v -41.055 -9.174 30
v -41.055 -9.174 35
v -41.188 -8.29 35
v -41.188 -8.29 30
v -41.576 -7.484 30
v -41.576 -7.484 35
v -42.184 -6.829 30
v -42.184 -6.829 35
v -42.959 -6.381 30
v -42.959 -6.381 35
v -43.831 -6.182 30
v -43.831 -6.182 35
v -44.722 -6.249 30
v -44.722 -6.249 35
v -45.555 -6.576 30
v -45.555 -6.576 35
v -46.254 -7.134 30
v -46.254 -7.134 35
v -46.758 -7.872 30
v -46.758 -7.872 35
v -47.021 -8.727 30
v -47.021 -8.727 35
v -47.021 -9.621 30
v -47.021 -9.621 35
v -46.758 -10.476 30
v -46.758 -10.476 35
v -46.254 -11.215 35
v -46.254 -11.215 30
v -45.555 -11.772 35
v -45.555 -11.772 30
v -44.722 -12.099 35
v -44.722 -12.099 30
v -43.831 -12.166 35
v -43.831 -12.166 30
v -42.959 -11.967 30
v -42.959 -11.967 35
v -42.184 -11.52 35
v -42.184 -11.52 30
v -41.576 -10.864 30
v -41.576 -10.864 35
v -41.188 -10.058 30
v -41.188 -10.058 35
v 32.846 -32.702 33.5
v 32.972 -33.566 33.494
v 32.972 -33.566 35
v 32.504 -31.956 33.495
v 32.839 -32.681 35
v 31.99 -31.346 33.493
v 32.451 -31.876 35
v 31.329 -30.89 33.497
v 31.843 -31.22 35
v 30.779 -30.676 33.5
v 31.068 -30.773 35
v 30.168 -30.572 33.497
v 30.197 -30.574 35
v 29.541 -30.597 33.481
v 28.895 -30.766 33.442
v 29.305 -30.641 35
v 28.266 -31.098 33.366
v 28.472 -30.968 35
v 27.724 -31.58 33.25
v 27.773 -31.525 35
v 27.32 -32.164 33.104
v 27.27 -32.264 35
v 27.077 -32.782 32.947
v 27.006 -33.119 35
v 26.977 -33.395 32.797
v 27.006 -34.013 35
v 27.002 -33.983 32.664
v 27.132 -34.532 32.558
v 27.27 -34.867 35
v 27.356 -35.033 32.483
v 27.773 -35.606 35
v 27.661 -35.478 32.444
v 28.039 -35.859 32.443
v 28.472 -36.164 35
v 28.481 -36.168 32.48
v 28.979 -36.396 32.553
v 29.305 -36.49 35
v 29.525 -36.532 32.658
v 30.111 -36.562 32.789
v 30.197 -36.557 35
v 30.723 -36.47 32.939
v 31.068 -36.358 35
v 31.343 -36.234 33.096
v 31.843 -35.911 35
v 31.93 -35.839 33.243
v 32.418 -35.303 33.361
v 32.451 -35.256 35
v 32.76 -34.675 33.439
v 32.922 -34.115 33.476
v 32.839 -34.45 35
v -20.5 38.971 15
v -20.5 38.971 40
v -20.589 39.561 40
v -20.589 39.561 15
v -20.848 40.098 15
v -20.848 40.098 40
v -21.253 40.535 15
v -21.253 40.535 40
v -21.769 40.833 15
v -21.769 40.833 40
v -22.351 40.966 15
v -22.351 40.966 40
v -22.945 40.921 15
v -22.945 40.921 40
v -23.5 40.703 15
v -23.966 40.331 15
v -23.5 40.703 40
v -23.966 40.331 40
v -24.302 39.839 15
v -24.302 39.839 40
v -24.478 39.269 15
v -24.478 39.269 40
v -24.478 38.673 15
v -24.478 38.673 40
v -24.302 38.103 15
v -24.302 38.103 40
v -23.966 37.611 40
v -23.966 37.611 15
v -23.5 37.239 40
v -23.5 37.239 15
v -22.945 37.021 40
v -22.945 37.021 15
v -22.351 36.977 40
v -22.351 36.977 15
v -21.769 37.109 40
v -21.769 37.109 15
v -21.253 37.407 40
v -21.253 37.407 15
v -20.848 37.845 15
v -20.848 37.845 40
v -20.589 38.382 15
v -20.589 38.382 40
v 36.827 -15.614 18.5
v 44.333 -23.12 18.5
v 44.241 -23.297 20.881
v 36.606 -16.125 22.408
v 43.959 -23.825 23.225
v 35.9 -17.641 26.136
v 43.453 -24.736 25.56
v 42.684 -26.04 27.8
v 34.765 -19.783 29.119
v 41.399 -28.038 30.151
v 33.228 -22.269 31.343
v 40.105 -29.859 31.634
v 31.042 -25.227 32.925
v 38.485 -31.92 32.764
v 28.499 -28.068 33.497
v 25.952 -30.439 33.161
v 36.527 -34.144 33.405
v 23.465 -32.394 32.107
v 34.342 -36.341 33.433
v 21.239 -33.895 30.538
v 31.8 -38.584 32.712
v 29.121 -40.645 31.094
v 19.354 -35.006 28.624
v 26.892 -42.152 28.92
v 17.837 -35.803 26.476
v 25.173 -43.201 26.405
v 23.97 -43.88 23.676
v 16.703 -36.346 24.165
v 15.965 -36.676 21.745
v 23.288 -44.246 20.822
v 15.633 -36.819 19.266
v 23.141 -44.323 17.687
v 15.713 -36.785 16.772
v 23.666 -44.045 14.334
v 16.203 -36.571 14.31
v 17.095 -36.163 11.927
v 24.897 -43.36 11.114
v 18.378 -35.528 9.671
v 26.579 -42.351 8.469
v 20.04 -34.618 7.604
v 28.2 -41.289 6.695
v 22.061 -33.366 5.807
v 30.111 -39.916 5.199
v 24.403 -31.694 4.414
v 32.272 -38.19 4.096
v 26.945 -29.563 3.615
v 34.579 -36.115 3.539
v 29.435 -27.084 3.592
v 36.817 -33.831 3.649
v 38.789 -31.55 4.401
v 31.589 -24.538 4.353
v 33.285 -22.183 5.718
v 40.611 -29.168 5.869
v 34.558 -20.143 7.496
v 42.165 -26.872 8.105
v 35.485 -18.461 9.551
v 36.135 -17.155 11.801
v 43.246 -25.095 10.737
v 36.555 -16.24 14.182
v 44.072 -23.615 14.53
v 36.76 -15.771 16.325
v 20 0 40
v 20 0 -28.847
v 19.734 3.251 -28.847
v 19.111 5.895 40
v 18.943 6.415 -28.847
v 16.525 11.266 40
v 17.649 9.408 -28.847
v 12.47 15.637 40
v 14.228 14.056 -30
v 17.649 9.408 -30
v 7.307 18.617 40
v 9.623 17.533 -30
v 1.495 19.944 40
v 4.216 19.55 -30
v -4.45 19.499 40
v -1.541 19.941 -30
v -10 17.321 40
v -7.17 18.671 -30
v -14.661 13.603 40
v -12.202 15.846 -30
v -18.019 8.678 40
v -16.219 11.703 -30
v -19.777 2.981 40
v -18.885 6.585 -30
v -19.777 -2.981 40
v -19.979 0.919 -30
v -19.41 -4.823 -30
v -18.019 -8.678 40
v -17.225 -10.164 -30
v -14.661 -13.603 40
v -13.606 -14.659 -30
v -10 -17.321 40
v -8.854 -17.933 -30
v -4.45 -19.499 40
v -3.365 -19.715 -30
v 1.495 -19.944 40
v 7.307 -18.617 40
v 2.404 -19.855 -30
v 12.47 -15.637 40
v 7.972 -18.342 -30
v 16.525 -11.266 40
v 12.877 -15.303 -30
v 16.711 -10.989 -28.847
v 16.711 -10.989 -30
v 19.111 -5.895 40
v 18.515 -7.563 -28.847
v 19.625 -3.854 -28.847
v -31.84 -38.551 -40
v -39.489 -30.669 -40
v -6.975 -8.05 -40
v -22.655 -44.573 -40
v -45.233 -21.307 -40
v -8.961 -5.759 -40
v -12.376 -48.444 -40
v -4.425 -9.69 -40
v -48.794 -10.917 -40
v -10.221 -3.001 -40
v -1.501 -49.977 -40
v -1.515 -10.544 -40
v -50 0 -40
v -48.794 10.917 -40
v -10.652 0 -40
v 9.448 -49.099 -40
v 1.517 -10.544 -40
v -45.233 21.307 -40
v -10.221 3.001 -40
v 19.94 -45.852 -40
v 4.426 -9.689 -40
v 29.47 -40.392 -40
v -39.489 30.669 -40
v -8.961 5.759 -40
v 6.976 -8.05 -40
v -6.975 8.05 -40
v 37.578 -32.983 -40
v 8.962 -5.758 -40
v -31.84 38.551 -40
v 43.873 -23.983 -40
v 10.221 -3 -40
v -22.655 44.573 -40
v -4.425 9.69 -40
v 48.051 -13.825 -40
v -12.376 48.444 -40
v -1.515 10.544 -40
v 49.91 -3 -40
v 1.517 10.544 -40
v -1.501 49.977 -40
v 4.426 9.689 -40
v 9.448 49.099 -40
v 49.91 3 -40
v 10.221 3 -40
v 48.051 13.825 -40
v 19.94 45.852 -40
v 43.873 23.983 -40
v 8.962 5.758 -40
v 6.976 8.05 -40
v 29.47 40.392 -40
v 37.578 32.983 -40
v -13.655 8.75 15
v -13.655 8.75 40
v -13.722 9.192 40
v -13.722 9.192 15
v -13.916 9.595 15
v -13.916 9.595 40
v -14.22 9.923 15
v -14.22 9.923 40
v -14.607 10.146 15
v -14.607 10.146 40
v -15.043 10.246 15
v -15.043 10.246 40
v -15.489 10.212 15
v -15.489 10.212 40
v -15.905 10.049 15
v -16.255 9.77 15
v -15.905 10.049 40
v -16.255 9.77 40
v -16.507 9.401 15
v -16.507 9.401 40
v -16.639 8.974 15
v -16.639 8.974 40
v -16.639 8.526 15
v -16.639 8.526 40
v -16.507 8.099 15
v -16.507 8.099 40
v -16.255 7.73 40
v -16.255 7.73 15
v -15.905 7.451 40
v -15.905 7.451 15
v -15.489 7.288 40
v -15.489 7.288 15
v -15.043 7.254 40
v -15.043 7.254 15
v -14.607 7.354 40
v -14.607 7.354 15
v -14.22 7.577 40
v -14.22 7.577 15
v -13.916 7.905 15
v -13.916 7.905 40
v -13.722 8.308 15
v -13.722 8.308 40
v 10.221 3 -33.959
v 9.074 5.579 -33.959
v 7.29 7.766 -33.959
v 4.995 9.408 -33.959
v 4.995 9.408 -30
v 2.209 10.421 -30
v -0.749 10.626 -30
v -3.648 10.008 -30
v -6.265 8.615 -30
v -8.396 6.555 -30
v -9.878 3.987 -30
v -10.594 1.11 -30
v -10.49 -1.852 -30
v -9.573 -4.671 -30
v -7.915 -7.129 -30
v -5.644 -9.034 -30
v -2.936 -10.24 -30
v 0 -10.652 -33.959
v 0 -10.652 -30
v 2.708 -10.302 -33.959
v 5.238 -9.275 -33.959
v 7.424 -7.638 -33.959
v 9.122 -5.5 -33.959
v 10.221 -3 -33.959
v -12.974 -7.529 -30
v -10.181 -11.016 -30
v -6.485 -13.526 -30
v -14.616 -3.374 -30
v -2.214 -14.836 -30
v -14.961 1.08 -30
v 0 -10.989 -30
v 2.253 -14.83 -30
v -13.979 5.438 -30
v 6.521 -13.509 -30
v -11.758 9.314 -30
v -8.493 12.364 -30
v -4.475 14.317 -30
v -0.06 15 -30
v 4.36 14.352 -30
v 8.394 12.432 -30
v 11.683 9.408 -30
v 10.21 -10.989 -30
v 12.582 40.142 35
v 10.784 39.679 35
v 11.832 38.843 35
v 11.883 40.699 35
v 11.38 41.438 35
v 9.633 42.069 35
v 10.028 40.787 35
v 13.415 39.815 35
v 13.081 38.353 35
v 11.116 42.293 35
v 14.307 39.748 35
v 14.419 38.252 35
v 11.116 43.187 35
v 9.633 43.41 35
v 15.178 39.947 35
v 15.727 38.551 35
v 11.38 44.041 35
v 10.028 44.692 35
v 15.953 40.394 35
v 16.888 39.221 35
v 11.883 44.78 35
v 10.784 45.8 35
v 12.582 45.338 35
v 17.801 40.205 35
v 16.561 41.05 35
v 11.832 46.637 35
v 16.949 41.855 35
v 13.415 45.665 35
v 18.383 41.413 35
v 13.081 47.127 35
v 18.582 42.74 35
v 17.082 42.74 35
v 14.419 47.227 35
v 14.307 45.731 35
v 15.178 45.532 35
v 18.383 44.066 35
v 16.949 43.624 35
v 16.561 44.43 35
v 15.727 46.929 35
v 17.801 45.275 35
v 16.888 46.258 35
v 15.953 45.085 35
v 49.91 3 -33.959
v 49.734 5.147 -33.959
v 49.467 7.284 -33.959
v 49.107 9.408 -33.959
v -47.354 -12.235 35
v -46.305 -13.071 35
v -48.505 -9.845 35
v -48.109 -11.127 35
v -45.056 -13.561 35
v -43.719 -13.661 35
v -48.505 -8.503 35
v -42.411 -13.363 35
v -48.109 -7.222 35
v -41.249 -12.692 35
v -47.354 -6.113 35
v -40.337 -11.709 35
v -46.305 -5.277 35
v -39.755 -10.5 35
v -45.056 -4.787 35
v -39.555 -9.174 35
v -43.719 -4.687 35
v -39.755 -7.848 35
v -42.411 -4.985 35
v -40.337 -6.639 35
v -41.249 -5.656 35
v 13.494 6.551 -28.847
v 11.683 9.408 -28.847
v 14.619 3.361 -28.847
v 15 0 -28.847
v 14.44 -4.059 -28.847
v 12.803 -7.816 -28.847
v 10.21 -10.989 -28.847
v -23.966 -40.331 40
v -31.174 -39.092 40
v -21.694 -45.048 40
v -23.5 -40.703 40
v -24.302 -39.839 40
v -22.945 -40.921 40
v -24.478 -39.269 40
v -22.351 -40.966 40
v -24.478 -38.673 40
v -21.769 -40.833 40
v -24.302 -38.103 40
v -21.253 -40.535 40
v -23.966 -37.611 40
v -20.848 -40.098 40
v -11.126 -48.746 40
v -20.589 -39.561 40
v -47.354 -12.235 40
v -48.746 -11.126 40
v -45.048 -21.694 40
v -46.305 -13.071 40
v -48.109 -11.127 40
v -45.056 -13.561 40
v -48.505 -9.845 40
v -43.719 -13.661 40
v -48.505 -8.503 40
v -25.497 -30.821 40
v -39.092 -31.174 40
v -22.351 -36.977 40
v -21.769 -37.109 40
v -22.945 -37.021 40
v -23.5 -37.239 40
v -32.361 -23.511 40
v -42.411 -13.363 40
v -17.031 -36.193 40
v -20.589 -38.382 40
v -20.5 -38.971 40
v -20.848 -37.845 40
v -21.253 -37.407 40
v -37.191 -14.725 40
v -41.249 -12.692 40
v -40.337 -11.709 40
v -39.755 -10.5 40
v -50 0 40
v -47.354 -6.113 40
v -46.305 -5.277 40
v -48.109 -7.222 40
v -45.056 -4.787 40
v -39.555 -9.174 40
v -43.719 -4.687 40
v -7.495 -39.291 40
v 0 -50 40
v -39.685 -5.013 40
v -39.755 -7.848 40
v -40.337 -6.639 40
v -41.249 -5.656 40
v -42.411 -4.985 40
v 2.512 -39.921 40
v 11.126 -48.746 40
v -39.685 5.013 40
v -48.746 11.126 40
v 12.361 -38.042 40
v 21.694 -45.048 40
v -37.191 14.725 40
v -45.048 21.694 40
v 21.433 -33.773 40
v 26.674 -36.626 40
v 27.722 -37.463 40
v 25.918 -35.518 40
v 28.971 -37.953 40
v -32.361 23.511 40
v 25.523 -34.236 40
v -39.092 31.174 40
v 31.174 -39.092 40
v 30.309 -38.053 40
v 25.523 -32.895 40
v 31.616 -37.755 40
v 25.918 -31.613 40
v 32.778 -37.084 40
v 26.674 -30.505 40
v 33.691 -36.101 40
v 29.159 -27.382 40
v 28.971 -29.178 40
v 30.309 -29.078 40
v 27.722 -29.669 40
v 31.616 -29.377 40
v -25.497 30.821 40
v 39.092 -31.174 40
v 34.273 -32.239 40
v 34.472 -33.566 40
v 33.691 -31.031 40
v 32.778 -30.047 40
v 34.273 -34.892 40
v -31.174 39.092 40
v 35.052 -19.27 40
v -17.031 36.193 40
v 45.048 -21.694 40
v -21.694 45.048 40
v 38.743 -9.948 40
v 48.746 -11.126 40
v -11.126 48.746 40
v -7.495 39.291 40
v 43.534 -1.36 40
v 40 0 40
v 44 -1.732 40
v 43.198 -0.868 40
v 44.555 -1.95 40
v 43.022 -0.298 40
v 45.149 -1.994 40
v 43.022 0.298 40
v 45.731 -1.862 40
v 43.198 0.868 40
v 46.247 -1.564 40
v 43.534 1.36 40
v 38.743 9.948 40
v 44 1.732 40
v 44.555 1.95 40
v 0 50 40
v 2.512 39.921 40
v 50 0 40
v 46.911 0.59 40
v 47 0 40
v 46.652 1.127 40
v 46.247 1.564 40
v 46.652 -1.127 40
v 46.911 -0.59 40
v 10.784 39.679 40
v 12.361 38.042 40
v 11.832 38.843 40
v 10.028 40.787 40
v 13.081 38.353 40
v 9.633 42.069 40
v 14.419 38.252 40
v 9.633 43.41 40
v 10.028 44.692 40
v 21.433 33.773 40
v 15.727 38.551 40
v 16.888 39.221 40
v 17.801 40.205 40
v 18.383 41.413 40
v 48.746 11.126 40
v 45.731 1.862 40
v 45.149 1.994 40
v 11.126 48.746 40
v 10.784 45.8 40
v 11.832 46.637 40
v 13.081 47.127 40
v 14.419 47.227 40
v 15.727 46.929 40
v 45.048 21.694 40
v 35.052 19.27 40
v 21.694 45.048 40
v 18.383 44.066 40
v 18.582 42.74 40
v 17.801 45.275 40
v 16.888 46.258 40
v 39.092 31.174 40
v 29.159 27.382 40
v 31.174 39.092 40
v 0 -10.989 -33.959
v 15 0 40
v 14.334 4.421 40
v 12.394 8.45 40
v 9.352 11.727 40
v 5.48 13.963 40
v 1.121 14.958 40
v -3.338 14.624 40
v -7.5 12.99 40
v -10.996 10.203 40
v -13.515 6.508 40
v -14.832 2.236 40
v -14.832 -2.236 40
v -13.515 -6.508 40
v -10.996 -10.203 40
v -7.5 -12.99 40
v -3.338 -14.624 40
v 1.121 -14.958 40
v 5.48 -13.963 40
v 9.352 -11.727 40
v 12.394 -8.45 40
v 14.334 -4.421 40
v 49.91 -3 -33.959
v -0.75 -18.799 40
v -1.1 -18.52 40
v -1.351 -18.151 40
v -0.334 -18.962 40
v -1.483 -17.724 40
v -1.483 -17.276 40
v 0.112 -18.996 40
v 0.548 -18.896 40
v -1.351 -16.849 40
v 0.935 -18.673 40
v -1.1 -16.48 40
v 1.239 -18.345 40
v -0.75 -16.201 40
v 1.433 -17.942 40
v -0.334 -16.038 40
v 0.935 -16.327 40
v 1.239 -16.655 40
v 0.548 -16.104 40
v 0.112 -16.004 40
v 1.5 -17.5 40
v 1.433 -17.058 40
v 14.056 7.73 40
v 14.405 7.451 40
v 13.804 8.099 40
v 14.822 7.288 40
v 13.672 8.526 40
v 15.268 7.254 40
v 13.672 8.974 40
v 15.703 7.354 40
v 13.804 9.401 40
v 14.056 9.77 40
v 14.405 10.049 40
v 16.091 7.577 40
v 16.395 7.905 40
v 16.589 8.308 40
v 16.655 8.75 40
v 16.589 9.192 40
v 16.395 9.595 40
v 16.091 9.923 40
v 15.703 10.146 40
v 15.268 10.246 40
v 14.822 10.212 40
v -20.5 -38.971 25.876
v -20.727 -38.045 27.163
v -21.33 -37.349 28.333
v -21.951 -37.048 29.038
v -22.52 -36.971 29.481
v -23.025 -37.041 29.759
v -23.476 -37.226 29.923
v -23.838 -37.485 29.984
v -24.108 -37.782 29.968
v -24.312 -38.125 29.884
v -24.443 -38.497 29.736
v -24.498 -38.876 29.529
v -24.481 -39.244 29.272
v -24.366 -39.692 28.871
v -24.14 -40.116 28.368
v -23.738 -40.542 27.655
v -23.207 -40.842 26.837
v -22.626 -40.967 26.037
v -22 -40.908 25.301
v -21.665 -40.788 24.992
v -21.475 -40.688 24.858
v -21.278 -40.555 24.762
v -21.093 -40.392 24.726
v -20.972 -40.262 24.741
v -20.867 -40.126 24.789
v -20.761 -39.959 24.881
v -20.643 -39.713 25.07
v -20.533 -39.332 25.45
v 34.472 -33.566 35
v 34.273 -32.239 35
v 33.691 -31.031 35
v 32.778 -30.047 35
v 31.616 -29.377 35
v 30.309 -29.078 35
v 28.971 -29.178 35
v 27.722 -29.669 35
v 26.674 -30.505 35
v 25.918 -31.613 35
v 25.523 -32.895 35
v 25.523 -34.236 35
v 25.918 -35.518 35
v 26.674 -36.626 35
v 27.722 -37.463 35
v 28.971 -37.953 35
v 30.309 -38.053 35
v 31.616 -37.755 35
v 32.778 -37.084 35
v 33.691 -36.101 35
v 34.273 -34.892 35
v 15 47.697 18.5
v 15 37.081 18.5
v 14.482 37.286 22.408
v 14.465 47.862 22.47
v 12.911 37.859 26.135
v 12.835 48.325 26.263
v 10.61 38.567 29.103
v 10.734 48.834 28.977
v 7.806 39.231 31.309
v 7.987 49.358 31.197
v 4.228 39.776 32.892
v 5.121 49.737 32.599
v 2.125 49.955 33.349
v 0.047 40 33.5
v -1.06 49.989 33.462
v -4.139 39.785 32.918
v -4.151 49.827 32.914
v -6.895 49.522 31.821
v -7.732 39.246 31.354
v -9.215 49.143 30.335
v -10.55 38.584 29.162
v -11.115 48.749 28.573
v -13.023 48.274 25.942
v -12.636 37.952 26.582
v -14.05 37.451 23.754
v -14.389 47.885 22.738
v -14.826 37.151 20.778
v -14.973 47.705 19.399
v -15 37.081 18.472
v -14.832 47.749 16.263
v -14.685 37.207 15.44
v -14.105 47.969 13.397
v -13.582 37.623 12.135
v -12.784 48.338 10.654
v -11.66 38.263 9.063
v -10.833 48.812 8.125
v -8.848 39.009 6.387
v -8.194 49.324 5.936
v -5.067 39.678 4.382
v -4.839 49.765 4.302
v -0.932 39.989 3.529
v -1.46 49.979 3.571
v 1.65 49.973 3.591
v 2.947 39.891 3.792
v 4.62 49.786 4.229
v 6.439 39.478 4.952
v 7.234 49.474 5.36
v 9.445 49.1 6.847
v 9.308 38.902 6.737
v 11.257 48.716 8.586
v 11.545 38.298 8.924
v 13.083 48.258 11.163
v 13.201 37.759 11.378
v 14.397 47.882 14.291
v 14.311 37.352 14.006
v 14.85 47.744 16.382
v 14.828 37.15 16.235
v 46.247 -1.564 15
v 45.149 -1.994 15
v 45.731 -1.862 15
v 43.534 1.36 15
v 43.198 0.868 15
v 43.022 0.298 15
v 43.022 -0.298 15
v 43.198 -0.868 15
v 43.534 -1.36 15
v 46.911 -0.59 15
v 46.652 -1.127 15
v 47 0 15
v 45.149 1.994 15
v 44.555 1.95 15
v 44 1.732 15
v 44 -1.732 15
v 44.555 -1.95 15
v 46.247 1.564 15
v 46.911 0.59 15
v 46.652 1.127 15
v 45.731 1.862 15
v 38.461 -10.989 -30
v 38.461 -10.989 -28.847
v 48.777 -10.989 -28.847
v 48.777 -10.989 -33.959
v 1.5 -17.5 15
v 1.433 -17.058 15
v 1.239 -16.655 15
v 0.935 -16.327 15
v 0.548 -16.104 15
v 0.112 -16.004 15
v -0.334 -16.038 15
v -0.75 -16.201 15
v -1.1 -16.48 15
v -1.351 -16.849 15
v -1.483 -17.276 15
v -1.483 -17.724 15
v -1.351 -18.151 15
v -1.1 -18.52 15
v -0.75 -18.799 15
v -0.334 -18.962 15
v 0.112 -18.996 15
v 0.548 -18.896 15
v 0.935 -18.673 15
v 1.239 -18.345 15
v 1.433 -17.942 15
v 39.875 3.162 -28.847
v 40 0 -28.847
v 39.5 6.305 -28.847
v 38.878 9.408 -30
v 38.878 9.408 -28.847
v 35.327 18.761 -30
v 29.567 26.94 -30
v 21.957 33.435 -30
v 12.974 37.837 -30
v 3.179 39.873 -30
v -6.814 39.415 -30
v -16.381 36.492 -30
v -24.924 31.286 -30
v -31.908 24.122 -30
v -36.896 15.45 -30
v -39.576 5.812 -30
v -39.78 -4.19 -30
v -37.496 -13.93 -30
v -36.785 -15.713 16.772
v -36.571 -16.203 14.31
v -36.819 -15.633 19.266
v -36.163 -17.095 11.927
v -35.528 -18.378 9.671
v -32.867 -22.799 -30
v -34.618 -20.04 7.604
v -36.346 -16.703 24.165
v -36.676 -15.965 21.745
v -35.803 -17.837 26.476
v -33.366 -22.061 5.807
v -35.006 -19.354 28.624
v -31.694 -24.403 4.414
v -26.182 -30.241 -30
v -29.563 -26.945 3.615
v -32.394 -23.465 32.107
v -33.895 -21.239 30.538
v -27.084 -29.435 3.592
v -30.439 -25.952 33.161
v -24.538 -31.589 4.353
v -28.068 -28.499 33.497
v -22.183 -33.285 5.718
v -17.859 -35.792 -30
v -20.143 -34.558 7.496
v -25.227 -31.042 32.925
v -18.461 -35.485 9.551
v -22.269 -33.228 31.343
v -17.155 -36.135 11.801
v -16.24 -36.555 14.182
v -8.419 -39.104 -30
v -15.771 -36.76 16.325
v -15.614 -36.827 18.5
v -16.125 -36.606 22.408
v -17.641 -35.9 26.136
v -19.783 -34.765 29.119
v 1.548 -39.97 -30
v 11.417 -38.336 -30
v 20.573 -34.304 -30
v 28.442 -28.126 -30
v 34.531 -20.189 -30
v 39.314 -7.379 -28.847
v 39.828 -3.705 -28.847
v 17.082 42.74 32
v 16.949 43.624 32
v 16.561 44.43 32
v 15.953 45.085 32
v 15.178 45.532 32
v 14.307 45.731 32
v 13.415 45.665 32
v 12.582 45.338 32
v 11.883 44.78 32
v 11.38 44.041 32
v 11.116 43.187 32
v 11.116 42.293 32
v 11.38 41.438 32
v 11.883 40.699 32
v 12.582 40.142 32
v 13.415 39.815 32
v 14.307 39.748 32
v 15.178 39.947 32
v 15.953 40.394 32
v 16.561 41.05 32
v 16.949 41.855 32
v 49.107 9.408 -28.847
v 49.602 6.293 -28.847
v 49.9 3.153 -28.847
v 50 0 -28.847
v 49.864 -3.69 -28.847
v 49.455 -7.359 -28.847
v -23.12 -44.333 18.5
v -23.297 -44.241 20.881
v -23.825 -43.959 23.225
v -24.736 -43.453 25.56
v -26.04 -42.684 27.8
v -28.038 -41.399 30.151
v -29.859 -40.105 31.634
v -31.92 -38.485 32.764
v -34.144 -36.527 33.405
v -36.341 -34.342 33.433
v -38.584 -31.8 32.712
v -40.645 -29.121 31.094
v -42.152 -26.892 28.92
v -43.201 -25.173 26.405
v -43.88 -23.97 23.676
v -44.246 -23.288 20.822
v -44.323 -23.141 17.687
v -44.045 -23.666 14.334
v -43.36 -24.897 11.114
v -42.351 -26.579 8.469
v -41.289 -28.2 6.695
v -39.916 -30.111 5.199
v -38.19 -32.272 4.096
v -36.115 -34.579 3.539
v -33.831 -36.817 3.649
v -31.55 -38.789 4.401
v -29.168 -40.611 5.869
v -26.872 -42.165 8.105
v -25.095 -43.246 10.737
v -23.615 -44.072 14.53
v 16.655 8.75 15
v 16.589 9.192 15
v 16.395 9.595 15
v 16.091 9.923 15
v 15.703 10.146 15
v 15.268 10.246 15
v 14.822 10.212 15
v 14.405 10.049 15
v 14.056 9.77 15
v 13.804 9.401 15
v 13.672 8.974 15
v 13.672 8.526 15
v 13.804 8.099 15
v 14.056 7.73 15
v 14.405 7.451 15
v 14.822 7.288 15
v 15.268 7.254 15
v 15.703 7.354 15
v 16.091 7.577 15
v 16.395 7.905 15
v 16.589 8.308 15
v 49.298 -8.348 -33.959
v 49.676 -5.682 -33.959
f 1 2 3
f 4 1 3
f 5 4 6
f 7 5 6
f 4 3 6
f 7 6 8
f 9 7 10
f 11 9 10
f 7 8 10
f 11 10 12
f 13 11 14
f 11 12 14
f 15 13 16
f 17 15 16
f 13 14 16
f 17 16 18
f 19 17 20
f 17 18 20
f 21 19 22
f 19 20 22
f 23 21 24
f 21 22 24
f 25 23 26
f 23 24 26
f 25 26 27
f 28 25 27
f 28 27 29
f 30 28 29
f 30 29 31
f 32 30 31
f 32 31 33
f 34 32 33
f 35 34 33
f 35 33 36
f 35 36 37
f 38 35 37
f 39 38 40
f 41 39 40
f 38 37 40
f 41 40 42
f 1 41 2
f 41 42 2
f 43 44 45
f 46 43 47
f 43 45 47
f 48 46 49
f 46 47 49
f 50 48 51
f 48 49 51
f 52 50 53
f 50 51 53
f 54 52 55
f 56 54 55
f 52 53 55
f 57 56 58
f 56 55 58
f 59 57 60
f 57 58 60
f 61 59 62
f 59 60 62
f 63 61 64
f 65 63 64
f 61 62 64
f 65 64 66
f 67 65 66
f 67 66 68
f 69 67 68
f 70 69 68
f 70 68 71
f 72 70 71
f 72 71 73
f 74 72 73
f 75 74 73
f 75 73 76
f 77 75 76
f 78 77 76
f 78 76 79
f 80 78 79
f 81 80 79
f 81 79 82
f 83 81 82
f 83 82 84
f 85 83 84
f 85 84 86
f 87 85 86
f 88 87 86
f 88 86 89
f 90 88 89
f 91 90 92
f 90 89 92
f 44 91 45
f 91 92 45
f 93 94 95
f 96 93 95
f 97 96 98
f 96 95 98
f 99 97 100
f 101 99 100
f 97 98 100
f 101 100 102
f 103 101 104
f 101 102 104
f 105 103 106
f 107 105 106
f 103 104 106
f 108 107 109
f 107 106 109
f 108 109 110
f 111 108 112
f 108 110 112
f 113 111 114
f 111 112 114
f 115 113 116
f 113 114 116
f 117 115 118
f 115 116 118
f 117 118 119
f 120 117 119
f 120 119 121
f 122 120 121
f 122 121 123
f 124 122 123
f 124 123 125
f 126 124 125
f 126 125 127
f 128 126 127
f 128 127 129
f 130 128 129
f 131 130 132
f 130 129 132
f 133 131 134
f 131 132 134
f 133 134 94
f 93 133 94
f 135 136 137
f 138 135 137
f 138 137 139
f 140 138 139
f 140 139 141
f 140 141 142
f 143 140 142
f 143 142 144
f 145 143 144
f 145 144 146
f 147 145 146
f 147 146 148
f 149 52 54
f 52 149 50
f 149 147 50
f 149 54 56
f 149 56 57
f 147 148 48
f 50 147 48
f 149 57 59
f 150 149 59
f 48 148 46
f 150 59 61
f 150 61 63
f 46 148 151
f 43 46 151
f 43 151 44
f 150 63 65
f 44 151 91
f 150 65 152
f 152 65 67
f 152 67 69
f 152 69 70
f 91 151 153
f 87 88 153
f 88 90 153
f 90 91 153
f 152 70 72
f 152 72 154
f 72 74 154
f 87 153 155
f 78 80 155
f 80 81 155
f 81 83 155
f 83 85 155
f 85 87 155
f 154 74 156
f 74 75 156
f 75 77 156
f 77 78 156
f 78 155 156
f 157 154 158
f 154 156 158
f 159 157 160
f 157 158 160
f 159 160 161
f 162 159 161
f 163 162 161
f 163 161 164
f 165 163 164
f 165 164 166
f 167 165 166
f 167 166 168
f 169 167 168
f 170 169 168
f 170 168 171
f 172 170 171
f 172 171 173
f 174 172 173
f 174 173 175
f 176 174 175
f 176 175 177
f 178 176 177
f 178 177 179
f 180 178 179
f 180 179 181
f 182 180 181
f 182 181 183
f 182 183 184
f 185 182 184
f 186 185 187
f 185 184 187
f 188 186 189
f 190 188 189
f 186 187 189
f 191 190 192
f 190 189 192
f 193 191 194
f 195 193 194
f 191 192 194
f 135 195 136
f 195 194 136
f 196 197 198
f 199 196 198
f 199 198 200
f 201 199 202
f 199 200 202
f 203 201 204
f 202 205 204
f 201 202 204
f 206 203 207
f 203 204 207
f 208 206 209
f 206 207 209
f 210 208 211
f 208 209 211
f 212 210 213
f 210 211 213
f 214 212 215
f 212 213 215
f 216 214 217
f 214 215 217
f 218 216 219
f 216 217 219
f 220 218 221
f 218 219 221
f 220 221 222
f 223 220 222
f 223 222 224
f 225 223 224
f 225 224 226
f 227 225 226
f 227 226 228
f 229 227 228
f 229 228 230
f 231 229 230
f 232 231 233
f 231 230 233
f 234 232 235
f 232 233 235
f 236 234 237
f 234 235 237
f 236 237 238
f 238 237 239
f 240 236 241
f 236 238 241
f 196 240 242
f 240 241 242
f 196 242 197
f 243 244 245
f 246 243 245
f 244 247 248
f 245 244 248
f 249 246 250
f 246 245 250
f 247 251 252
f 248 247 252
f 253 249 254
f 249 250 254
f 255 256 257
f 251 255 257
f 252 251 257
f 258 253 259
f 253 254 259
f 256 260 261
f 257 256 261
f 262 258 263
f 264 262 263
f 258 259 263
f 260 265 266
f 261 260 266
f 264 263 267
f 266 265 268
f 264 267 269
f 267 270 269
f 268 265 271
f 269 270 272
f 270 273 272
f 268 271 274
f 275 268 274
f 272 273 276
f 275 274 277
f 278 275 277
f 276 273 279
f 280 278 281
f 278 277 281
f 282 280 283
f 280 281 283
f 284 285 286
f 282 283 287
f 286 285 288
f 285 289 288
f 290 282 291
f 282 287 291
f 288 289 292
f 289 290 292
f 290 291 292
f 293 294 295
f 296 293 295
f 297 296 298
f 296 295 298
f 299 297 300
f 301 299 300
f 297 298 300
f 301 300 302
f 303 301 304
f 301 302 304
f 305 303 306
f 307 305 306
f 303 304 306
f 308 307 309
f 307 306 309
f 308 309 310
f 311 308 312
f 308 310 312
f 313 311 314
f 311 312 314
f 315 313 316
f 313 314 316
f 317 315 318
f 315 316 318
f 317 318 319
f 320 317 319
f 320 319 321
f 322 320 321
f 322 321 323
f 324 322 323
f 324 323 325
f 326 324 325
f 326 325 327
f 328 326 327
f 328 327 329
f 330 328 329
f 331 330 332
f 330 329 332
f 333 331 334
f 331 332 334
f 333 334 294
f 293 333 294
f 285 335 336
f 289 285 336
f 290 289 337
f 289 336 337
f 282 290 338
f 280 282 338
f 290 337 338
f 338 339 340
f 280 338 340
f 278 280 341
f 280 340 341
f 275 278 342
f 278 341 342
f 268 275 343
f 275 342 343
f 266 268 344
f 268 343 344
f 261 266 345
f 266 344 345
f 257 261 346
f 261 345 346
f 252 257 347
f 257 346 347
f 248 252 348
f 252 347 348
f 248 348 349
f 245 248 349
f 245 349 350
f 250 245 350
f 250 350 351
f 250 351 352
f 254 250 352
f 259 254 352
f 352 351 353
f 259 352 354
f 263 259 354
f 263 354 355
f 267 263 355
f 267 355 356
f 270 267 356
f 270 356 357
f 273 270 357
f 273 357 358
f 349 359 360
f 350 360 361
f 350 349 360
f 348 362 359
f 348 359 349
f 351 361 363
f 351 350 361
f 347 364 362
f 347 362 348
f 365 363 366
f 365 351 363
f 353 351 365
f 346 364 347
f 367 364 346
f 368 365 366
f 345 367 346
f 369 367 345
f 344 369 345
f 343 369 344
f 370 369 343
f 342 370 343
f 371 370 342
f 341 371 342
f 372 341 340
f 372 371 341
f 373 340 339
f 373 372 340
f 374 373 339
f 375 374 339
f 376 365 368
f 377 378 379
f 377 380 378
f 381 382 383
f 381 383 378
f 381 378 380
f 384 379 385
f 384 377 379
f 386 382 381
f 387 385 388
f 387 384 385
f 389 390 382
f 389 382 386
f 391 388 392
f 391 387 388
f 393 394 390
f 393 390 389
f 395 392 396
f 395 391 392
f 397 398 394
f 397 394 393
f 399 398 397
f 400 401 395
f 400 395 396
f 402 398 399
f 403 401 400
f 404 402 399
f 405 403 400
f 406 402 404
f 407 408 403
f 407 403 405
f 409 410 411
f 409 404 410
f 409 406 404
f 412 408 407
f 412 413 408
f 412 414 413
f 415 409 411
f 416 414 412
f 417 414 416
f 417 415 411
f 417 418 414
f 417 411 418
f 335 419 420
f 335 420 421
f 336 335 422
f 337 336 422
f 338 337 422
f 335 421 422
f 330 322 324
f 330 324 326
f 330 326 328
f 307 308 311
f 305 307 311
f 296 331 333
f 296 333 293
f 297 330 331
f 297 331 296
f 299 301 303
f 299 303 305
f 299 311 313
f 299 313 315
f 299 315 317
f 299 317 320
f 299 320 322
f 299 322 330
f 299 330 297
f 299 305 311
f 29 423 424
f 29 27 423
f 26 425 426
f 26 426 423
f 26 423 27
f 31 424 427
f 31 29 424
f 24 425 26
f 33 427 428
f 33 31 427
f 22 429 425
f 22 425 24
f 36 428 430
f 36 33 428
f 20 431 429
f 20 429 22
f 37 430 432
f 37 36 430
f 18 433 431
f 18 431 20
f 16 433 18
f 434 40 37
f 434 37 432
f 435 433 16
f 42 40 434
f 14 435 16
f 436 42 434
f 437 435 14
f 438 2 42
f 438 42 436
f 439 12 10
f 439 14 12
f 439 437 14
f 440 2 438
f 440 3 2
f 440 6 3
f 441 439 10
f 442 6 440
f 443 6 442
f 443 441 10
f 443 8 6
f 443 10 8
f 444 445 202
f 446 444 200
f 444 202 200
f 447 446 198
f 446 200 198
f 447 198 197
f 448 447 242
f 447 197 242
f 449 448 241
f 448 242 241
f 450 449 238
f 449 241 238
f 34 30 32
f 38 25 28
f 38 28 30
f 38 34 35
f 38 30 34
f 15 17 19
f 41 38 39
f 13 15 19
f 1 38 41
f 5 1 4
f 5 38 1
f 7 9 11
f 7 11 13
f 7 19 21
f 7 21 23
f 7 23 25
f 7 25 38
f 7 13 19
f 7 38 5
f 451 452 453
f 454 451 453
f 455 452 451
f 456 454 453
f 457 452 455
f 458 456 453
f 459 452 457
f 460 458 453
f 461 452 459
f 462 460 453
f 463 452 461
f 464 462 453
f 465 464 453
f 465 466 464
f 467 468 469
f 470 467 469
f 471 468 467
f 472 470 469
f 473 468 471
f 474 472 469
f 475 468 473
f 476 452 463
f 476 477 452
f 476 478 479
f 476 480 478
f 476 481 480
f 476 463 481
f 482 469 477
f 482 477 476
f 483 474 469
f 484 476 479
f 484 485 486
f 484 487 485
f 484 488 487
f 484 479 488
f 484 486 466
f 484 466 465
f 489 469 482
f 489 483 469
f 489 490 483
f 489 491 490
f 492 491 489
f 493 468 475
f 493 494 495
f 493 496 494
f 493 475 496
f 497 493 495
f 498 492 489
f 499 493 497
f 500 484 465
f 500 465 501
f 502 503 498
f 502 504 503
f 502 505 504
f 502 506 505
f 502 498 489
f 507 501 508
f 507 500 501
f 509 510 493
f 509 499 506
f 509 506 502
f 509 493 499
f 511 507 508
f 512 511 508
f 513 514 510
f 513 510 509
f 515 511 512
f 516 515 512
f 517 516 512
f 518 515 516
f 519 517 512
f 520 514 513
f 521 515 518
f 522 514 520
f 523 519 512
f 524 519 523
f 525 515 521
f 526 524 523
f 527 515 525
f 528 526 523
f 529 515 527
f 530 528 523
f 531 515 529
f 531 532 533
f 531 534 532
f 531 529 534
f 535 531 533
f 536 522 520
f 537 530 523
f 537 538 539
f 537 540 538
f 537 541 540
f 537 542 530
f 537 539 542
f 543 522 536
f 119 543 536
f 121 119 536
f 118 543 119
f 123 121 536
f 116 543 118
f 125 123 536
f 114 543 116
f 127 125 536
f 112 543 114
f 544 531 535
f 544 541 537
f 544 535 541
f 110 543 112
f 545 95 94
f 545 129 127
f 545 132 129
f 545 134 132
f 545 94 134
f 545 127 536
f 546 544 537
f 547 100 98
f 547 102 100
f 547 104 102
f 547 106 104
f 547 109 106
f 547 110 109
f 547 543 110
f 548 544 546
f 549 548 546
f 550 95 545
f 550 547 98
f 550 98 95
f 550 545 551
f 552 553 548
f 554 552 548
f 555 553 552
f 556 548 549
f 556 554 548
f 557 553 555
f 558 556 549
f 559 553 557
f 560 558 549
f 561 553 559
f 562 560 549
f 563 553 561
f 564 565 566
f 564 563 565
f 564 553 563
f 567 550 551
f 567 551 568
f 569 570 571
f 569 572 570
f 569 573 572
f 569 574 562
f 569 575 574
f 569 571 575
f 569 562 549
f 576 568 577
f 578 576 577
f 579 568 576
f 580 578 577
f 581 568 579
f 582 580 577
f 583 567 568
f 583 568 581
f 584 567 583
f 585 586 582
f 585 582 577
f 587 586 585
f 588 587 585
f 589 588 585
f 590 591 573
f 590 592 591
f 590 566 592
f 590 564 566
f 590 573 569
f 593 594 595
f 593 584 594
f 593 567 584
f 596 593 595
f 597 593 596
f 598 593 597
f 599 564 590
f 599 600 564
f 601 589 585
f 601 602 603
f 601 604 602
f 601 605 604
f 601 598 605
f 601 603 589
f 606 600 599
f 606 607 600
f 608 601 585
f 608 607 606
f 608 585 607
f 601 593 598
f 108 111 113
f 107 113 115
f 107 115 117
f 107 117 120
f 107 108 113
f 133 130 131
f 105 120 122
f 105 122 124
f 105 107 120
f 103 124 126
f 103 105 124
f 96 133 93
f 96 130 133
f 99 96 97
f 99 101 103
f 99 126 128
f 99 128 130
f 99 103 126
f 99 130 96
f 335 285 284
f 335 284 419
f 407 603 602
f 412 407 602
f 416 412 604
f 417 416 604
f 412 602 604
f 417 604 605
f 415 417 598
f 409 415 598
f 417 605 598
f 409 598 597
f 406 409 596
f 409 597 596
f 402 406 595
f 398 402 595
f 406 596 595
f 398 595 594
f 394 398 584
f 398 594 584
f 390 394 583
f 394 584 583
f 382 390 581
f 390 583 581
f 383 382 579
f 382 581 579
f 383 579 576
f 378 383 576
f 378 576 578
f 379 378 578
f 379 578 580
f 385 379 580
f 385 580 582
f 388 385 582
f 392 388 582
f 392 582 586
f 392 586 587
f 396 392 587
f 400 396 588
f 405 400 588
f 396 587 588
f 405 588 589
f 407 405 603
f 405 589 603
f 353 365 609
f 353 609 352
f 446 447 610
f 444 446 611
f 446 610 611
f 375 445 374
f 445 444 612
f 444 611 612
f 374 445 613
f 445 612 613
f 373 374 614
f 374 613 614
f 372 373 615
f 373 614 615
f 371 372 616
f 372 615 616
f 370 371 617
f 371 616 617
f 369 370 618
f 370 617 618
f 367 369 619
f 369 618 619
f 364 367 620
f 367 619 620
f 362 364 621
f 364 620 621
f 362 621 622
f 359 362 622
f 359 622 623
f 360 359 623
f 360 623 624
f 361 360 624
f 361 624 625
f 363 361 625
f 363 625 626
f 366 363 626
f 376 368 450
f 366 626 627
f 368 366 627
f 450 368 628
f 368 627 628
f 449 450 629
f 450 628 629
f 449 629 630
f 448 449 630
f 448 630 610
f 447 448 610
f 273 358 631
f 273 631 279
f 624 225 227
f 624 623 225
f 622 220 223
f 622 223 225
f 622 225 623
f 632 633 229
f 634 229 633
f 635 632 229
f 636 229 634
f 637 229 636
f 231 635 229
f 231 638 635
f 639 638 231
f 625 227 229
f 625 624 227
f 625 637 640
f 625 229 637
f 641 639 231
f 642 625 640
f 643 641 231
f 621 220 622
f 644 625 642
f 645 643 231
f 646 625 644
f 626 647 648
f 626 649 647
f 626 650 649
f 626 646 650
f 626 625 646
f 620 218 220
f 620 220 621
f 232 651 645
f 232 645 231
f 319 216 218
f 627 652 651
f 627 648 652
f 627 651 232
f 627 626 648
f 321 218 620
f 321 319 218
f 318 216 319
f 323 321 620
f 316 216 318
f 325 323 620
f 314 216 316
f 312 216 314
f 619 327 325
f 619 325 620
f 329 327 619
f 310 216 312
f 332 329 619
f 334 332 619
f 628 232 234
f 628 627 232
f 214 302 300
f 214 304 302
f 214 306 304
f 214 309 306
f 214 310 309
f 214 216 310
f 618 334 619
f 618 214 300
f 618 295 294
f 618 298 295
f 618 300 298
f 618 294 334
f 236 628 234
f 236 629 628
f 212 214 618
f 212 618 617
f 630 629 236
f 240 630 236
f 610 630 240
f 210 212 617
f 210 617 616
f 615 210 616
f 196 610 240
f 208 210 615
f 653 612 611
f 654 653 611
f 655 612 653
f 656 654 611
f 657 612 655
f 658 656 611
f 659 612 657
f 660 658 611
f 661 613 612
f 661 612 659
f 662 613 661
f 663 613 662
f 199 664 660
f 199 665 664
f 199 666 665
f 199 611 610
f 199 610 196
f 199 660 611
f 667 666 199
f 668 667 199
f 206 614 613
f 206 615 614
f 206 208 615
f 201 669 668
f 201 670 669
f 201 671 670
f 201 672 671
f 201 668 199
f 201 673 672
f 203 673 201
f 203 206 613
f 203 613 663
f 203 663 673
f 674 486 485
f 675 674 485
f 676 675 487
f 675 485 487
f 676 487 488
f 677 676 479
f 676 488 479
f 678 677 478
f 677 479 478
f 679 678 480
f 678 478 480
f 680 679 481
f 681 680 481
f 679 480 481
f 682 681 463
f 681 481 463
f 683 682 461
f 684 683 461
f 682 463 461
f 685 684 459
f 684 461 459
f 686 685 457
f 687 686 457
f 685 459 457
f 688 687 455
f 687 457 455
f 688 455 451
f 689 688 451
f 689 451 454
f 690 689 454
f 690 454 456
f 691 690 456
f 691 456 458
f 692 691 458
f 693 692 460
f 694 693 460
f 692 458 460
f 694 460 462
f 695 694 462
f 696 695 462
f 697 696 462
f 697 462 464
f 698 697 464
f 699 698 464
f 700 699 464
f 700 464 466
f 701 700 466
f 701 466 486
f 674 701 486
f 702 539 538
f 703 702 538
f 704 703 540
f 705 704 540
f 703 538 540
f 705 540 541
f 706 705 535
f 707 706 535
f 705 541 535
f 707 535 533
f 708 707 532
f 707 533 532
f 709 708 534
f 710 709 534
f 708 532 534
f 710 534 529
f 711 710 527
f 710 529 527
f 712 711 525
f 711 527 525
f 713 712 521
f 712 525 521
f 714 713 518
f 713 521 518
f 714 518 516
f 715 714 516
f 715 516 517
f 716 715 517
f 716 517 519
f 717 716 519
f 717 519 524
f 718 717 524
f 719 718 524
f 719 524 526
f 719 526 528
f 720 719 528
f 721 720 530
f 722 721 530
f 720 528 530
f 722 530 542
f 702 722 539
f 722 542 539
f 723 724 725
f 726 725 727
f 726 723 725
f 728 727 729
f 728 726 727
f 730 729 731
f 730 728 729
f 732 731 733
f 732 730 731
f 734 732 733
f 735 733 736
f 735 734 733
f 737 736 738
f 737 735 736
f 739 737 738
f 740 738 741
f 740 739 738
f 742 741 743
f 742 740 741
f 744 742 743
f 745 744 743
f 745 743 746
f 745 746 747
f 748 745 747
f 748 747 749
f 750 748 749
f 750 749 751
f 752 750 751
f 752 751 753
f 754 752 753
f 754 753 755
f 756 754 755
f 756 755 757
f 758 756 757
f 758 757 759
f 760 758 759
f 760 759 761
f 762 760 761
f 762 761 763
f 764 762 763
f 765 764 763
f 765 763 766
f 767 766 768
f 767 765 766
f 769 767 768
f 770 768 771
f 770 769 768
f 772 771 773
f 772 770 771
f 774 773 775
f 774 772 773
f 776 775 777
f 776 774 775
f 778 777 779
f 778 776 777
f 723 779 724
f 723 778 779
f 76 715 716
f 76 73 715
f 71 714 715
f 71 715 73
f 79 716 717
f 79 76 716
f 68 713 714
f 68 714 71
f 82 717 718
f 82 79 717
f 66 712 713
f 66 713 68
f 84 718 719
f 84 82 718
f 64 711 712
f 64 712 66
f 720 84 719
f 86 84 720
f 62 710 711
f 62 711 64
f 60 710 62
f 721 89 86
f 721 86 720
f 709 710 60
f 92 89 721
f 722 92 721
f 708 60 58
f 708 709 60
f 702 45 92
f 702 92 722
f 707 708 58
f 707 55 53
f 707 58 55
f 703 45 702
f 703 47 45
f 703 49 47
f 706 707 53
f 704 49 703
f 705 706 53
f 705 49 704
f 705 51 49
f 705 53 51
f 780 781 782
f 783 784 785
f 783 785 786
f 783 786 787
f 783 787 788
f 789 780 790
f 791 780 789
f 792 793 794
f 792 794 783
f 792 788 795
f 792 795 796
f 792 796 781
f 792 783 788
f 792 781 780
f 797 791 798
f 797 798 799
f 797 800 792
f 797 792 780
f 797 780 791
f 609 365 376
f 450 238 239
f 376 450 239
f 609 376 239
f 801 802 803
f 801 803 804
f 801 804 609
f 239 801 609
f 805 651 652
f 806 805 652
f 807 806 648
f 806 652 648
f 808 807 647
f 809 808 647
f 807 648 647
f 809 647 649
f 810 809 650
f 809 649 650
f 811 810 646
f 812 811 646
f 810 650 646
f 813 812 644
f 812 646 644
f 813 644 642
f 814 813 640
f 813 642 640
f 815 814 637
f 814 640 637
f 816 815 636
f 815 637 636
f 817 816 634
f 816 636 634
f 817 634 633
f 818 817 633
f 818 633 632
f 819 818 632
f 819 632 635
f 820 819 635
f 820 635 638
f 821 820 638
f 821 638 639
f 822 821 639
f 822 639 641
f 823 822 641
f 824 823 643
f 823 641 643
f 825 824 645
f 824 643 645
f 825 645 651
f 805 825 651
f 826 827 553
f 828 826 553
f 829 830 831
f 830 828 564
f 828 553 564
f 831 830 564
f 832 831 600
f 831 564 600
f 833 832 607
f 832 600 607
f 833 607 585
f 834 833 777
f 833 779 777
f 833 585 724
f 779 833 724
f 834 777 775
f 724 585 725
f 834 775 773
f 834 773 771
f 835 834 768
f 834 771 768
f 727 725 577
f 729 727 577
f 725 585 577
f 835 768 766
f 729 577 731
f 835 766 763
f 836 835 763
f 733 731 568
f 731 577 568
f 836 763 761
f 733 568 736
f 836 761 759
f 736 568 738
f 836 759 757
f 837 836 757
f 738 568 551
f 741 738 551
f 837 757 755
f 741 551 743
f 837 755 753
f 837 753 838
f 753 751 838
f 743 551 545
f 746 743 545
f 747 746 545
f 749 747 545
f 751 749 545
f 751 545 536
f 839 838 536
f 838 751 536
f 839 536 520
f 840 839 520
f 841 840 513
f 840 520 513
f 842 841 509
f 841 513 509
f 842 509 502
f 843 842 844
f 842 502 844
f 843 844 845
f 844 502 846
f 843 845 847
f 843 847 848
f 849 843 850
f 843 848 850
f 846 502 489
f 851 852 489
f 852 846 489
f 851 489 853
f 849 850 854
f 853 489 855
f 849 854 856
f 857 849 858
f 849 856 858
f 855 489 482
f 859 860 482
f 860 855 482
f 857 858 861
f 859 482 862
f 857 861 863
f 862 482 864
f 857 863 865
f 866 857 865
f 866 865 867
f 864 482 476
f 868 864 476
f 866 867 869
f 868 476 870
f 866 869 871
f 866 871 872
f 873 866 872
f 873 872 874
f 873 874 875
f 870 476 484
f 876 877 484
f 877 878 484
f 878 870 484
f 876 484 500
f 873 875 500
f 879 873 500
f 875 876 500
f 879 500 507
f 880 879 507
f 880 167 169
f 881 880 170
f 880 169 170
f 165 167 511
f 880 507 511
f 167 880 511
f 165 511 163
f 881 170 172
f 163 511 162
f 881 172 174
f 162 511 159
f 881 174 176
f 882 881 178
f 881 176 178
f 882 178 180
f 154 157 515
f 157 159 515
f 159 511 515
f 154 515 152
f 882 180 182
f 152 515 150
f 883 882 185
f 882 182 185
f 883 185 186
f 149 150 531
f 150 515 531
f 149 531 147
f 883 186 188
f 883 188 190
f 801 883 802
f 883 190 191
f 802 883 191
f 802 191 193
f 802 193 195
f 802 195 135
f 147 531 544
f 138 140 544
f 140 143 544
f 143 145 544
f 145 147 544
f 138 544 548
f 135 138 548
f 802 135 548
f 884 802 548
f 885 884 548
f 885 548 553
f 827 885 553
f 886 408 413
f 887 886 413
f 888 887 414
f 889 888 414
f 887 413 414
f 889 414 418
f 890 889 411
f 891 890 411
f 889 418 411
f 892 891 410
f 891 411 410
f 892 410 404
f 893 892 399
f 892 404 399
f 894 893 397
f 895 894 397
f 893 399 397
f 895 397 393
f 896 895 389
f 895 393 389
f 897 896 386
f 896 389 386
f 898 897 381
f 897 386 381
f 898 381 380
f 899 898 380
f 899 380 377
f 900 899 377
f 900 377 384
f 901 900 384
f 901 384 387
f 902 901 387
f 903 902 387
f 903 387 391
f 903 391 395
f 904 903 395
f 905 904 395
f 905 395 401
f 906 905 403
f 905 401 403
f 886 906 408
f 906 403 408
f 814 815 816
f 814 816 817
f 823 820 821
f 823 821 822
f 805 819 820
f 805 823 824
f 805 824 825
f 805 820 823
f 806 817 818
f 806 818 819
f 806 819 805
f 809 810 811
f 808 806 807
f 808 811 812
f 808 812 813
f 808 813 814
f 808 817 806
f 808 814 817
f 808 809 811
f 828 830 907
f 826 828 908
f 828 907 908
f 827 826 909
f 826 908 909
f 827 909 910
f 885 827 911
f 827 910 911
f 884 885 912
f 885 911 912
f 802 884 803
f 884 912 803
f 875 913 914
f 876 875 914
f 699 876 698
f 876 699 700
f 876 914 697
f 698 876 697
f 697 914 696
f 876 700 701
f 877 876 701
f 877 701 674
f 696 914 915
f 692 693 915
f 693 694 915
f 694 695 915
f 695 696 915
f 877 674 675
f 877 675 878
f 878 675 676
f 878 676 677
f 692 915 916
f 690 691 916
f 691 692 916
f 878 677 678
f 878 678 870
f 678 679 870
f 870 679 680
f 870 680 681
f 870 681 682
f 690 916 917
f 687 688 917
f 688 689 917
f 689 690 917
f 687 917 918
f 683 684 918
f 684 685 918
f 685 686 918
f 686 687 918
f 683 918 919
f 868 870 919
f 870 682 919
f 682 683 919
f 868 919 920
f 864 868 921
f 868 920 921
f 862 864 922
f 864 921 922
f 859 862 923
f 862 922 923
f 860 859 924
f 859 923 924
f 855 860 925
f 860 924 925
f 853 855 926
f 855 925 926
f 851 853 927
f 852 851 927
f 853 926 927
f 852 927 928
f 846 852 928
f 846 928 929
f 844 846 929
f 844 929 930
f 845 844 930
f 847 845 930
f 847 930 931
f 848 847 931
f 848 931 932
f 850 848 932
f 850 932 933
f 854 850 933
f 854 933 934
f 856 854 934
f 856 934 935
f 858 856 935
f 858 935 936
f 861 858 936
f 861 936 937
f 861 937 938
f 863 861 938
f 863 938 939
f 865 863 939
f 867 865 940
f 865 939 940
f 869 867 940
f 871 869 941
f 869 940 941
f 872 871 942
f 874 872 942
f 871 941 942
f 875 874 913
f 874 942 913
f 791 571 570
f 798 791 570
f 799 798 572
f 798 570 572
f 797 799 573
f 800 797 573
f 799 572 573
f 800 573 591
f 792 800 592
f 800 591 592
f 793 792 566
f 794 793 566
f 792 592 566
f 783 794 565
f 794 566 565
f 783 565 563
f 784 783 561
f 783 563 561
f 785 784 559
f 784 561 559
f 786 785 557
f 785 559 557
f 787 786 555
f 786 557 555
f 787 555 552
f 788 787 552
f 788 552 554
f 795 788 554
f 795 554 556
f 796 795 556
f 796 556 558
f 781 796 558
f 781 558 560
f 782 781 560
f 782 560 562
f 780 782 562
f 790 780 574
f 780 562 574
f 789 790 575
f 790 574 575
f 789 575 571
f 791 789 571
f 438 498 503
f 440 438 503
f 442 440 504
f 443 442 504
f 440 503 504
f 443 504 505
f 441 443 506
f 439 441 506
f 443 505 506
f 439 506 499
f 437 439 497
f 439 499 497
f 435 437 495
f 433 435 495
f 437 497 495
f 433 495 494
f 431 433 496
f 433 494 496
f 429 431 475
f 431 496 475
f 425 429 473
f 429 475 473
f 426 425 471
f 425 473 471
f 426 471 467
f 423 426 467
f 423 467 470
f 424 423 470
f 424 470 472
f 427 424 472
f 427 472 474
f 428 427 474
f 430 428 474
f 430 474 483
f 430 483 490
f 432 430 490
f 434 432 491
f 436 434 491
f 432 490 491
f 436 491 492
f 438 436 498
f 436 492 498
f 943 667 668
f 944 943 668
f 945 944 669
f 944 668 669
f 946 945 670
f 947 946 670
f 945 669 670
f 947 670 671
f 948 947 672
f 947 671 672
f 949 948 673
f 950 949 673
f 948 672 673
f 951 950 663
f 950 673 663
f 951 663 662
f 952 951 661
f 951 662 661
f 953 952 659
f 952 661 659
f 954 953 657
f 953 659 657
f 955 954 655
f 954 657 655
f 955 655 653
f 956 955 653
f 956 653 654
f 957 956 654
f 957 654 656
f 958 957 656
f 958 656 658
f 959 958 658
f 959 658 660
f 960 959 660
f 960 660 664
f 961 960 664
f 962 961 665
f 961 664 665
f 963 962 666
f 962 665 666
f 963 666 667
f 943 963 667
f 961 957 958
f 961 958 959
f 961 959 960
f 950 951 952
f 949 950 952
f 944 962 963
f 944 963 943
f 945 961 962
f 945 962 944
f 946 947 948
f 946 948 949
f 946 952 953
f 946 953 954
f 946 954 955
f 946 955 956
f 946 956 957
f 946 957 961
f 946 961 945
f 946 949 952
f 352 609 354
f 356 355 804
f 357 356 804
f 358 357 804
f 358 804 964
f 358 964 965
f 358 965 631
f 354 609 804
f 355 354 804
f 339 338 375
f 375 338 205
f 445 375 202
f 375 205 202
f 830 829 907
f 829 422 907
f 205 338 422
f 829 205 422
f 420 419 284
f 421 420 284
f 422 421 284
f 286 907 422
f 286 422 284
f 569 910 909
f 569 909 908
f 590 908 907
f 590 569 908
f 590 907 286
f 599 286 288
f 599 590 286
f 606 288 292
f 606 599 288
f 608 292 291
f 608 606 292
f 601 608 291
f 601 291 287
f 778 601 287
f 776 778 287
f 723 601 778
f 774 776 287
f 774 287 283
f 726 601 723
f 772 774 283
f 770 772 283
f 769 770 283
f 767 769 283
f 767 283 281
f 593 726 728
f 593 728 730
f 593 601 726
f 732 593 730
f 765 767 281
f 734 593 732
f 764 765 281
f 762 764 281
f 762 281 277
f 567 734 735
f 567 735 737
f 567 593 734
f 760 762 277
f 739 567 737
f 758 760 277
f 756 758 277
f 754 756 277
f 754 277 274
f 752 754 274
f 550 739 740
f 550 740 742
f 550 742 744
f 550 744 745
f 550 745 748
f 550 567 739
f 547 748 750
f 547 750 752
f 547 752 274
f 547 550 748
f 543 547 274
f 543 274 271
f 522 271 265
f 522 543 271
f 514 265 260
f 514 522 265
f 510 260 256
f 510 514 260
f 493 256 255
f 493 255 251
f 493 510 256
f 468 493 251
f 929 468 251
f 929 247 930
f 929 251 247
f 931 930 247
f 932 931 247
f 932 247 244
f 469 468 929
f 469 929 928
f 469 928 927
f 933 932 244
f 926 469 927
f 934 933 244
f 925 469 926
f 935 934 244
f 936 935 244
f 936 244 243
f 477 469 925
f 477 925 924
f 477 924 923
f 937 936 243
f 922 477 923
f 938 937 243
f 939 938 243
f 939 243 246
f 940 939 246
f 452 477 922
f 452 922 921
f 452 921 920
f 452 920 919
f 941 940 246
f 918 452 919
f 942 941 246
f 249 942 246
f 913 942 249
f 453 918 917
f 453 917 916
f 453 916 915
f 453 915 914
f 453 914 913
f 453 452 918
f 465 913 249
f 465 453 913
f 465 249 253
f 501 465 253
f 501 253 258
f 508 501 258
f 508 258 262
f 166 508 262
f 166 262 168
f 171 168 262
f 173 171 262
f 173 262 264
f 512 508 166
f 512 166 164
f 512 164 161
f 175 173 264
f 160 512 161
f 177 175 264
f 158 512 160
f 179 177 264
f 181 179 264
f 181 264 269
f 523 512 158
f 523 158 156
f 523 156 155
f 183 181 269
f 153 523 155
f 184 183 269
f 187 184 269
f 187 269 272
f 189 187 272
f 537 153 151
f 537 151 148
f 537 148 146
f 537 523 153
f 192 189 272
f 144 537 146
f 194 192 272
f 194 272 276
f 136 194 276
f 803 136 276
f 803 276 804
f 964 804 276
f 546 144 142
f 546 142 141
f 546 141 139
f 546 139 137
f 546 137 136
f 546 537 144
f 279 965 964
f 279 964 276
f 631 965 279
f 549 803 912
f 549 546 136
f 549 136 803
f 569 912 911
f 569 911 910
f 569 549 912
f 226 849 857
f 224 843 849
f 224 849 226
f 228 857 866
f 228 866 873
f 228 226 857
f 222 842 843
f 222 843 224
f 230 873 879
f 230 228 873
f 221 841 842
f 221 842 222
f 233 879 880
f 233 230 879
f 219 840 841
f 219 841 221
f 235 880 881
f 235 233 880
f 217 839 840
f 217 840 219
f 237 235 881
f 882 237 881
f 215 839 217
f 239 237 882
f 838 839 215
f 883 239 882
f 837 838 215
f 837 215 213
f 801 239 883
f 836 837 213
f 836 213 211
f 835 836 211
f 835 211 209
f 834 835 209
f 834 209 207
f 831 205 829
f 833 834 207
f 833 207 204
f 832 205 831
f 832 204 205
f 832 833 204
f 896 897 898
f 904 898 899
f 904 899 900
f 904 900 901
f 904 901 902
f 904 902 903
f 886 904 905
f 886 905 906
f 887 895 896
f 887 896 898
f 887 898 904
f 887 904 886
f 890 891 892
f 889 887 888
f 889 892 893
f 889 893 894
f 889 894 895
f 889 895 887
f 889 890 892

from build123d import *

# Parameters (mm, degrees)
F0_R      = 50
F1_DEPTH  = 40
F2_R      = 40
F3_DEPTH  = 70
F4_R      = 20
F5_DEPTH  = 70
F6_R      = 15
F7_DEPTH  = 70
F8_R      = 4.5
F9_DEPTH  = 5
F10_R     = 3
F11_DEPTH = 3
F12_R     = 3
F13_DEPTH = 5
F14_R     = 3
F15_DEPTH = 5
F16_DEPTH = 5
F17_R     = 2
F18_DEPTH = 25
F19_R     = 1.5
F20_DEPTH = 25
F22_R     = 15
F23_DEPTH = 15
F26_R     = 15
F27_DEPTH = 25
F32_R     = 15
F33_DEPTH = 25
F35_DEPTH = 50
F36_R     = 10.6520252132
F37_DEPTH = 25


with BuildPart() as f1:
    # F0 (on Top) → F1 (new body, symmetric)
    with BuildSketch(Plane.XY):
        Circle(F0_R)
    extrude(amount=F1_DEPTH, both=True)

    # F2 (on face) → F3 (cut)
    with BuildSketch(Plane.XY.offset(40)):
        Circle(F2_R)
    extrude(amount=-F3_DEPTH, mode=Mode.SUBTRACT)

    # F4 (on face) → F5 (join)
    with BuildSketch(Plane.XY.offset(-30)):
        Circle(F4_R)
    extrude(amount=F5_DEPTH)

    # F6 (on face) → F7 (cut)
    with BuildSketch(Plane.XY.offset(40)):
        Circle(F6_R)
    extrude(amount=-F7_DEPTH, mode=Mode.SUBTRACT)

    # F8 (on face) → F9 (cut)
    with BuildSketch(Plane.XY.offset(40)):
        with Locations((-44.0549232574, -9.1740796152)):
            Circle(F8_R)
        with Locations((29.9724476318, -33.5656428951)):
            Circle(F8_R)
        with Locations((14.0824756256, 42.7397225103)):
            Circle(F8_R)
    extrude(amount=-F9_DEPTH, mode=Mode.SUBTRACT)

    # F10 (on face) → F11 (cut)
    with BuildSketch(Plane.XY.offset(35)):
        with Locations((14.0824756256, 42.7397225103)):
            Circle(F10_R)
    extrude(amount=-F11_DEPTH, mode=Mode.SUBTRACT)

    # F12 (on face) → F13 (cut)
    with BuildSketch(Plane.XY.offset(35)):
        with Locations((-44.0549232574, -9.1740796152)):
            Circle(F12_R)
    extrude(amount=-F13_DEPTH, mode=Mode.SUBTRACT)

    # F14 (on face) → F15 (cut)
    with BuildSketch(Plane.XY.offset(35)):
        with Locations((29.9724476318, -33.5656428951)):
            Circle(F14_R)
    extrude(amount=F15_DEPTH, mode=Mode.SUBTRACT)

    # F14 (on face) → F16 (cut)
    with BuildSketch(Plane.XY.offset(35)):
        with Locations((29.9724476318, -33.5656428951)):
            Circle(F14_R)
    extrude(amount=-F16_DEPTH, mode=Mode.SUBTRACT)

    # F17 (on face) → F18 (cut)
    with BuildSketch(Plane.XY.offset(40)):
        with Locations((-22.5, 38.9711431703)):
            Circle(F17_R)
        with Locations((-22.5, -38.9711431703)):
            Circle(F17_R)
        with Locations((45, 0)):
            Circle(F17_R)
    extrude(amount=-F18_DEPTH, mode=Mode.SUBTRACT)

    # F19 (on face) → F20 (cut)
    with BuildSketch(Plane.XY.offset(40)):
        with Locations((-15.1554445662, 8.75)):
            Circle(F19_R)
        with Locations((15.1554445662, 8.75)):
            Circle(F19_R)
        with Locations((0, -17.5)):
            Circle(F19_R)
    extrude(amount=-F20_DEPTH, mode=Mode.SUBTRACT)

    # F22 (on offset) → F23 (cut)
    with BuildSketch(Plane.XZ.offset(-50)):
        with Locations((0, 18.5)):
            Circle(F22_R)
    extrude(amount=F23_DEPTH, mode=Mode.SUBTRACT)

    # F26 (on face) → F27 (cut)
    with BuildSketch(Plane(origin=(-35.3553390593, -35.3553390593, 0), x_dir=(0.7071067812, -0.7071067812, 0), z_dir=(-0.7071067812, -0.7071067812, 0))):
        with Locations((0, 18.5)):
            Circle(F26_R)
    extrude(amount=-F27_DEPTH, mode=Mode.SUBTRACT)

    # F32 (on face) → F33 (cut)
    with BuildSketch(Plane(origin=(35.3553390593, -35.3553390593, 0), x_dir=(0.7071067812, 0.7071067812, 0), z_dir=(0.7071067812, -0.7071067812, 0))):
        with Locations((0, 18.5)):
            Circle(F32_R)
    extrude(amount=-F33_DEPTH, mode=Mode.SUBTRACT)

    # F34 (on offset) → F35 (cut)
    with BuildSketch(Plane.YZ.offset(50)):
        Polygon((-3, -33.9592769742), (-3, -40), (0, -40), (3, -40), (3, -33.9592769742), (9.4083147123, -33.9592769742), (9.4083147123, -28.8467667997), (-10.9889963642, -28.8467667997), (-10.9889963642, -33.9592769742), align=None)
    extrude(amount=-F35_DEPTH, mode=Mode.SUBTRACT)

    # F36 (on face) → F37 (cut)
    with BuildSketch(Plane.XY.offset(-30)):
        Circle(F36_R)
    extrude(amount=-F37_DEPTH, mode=Mode.SUBTRACT)


solid = f1.part
